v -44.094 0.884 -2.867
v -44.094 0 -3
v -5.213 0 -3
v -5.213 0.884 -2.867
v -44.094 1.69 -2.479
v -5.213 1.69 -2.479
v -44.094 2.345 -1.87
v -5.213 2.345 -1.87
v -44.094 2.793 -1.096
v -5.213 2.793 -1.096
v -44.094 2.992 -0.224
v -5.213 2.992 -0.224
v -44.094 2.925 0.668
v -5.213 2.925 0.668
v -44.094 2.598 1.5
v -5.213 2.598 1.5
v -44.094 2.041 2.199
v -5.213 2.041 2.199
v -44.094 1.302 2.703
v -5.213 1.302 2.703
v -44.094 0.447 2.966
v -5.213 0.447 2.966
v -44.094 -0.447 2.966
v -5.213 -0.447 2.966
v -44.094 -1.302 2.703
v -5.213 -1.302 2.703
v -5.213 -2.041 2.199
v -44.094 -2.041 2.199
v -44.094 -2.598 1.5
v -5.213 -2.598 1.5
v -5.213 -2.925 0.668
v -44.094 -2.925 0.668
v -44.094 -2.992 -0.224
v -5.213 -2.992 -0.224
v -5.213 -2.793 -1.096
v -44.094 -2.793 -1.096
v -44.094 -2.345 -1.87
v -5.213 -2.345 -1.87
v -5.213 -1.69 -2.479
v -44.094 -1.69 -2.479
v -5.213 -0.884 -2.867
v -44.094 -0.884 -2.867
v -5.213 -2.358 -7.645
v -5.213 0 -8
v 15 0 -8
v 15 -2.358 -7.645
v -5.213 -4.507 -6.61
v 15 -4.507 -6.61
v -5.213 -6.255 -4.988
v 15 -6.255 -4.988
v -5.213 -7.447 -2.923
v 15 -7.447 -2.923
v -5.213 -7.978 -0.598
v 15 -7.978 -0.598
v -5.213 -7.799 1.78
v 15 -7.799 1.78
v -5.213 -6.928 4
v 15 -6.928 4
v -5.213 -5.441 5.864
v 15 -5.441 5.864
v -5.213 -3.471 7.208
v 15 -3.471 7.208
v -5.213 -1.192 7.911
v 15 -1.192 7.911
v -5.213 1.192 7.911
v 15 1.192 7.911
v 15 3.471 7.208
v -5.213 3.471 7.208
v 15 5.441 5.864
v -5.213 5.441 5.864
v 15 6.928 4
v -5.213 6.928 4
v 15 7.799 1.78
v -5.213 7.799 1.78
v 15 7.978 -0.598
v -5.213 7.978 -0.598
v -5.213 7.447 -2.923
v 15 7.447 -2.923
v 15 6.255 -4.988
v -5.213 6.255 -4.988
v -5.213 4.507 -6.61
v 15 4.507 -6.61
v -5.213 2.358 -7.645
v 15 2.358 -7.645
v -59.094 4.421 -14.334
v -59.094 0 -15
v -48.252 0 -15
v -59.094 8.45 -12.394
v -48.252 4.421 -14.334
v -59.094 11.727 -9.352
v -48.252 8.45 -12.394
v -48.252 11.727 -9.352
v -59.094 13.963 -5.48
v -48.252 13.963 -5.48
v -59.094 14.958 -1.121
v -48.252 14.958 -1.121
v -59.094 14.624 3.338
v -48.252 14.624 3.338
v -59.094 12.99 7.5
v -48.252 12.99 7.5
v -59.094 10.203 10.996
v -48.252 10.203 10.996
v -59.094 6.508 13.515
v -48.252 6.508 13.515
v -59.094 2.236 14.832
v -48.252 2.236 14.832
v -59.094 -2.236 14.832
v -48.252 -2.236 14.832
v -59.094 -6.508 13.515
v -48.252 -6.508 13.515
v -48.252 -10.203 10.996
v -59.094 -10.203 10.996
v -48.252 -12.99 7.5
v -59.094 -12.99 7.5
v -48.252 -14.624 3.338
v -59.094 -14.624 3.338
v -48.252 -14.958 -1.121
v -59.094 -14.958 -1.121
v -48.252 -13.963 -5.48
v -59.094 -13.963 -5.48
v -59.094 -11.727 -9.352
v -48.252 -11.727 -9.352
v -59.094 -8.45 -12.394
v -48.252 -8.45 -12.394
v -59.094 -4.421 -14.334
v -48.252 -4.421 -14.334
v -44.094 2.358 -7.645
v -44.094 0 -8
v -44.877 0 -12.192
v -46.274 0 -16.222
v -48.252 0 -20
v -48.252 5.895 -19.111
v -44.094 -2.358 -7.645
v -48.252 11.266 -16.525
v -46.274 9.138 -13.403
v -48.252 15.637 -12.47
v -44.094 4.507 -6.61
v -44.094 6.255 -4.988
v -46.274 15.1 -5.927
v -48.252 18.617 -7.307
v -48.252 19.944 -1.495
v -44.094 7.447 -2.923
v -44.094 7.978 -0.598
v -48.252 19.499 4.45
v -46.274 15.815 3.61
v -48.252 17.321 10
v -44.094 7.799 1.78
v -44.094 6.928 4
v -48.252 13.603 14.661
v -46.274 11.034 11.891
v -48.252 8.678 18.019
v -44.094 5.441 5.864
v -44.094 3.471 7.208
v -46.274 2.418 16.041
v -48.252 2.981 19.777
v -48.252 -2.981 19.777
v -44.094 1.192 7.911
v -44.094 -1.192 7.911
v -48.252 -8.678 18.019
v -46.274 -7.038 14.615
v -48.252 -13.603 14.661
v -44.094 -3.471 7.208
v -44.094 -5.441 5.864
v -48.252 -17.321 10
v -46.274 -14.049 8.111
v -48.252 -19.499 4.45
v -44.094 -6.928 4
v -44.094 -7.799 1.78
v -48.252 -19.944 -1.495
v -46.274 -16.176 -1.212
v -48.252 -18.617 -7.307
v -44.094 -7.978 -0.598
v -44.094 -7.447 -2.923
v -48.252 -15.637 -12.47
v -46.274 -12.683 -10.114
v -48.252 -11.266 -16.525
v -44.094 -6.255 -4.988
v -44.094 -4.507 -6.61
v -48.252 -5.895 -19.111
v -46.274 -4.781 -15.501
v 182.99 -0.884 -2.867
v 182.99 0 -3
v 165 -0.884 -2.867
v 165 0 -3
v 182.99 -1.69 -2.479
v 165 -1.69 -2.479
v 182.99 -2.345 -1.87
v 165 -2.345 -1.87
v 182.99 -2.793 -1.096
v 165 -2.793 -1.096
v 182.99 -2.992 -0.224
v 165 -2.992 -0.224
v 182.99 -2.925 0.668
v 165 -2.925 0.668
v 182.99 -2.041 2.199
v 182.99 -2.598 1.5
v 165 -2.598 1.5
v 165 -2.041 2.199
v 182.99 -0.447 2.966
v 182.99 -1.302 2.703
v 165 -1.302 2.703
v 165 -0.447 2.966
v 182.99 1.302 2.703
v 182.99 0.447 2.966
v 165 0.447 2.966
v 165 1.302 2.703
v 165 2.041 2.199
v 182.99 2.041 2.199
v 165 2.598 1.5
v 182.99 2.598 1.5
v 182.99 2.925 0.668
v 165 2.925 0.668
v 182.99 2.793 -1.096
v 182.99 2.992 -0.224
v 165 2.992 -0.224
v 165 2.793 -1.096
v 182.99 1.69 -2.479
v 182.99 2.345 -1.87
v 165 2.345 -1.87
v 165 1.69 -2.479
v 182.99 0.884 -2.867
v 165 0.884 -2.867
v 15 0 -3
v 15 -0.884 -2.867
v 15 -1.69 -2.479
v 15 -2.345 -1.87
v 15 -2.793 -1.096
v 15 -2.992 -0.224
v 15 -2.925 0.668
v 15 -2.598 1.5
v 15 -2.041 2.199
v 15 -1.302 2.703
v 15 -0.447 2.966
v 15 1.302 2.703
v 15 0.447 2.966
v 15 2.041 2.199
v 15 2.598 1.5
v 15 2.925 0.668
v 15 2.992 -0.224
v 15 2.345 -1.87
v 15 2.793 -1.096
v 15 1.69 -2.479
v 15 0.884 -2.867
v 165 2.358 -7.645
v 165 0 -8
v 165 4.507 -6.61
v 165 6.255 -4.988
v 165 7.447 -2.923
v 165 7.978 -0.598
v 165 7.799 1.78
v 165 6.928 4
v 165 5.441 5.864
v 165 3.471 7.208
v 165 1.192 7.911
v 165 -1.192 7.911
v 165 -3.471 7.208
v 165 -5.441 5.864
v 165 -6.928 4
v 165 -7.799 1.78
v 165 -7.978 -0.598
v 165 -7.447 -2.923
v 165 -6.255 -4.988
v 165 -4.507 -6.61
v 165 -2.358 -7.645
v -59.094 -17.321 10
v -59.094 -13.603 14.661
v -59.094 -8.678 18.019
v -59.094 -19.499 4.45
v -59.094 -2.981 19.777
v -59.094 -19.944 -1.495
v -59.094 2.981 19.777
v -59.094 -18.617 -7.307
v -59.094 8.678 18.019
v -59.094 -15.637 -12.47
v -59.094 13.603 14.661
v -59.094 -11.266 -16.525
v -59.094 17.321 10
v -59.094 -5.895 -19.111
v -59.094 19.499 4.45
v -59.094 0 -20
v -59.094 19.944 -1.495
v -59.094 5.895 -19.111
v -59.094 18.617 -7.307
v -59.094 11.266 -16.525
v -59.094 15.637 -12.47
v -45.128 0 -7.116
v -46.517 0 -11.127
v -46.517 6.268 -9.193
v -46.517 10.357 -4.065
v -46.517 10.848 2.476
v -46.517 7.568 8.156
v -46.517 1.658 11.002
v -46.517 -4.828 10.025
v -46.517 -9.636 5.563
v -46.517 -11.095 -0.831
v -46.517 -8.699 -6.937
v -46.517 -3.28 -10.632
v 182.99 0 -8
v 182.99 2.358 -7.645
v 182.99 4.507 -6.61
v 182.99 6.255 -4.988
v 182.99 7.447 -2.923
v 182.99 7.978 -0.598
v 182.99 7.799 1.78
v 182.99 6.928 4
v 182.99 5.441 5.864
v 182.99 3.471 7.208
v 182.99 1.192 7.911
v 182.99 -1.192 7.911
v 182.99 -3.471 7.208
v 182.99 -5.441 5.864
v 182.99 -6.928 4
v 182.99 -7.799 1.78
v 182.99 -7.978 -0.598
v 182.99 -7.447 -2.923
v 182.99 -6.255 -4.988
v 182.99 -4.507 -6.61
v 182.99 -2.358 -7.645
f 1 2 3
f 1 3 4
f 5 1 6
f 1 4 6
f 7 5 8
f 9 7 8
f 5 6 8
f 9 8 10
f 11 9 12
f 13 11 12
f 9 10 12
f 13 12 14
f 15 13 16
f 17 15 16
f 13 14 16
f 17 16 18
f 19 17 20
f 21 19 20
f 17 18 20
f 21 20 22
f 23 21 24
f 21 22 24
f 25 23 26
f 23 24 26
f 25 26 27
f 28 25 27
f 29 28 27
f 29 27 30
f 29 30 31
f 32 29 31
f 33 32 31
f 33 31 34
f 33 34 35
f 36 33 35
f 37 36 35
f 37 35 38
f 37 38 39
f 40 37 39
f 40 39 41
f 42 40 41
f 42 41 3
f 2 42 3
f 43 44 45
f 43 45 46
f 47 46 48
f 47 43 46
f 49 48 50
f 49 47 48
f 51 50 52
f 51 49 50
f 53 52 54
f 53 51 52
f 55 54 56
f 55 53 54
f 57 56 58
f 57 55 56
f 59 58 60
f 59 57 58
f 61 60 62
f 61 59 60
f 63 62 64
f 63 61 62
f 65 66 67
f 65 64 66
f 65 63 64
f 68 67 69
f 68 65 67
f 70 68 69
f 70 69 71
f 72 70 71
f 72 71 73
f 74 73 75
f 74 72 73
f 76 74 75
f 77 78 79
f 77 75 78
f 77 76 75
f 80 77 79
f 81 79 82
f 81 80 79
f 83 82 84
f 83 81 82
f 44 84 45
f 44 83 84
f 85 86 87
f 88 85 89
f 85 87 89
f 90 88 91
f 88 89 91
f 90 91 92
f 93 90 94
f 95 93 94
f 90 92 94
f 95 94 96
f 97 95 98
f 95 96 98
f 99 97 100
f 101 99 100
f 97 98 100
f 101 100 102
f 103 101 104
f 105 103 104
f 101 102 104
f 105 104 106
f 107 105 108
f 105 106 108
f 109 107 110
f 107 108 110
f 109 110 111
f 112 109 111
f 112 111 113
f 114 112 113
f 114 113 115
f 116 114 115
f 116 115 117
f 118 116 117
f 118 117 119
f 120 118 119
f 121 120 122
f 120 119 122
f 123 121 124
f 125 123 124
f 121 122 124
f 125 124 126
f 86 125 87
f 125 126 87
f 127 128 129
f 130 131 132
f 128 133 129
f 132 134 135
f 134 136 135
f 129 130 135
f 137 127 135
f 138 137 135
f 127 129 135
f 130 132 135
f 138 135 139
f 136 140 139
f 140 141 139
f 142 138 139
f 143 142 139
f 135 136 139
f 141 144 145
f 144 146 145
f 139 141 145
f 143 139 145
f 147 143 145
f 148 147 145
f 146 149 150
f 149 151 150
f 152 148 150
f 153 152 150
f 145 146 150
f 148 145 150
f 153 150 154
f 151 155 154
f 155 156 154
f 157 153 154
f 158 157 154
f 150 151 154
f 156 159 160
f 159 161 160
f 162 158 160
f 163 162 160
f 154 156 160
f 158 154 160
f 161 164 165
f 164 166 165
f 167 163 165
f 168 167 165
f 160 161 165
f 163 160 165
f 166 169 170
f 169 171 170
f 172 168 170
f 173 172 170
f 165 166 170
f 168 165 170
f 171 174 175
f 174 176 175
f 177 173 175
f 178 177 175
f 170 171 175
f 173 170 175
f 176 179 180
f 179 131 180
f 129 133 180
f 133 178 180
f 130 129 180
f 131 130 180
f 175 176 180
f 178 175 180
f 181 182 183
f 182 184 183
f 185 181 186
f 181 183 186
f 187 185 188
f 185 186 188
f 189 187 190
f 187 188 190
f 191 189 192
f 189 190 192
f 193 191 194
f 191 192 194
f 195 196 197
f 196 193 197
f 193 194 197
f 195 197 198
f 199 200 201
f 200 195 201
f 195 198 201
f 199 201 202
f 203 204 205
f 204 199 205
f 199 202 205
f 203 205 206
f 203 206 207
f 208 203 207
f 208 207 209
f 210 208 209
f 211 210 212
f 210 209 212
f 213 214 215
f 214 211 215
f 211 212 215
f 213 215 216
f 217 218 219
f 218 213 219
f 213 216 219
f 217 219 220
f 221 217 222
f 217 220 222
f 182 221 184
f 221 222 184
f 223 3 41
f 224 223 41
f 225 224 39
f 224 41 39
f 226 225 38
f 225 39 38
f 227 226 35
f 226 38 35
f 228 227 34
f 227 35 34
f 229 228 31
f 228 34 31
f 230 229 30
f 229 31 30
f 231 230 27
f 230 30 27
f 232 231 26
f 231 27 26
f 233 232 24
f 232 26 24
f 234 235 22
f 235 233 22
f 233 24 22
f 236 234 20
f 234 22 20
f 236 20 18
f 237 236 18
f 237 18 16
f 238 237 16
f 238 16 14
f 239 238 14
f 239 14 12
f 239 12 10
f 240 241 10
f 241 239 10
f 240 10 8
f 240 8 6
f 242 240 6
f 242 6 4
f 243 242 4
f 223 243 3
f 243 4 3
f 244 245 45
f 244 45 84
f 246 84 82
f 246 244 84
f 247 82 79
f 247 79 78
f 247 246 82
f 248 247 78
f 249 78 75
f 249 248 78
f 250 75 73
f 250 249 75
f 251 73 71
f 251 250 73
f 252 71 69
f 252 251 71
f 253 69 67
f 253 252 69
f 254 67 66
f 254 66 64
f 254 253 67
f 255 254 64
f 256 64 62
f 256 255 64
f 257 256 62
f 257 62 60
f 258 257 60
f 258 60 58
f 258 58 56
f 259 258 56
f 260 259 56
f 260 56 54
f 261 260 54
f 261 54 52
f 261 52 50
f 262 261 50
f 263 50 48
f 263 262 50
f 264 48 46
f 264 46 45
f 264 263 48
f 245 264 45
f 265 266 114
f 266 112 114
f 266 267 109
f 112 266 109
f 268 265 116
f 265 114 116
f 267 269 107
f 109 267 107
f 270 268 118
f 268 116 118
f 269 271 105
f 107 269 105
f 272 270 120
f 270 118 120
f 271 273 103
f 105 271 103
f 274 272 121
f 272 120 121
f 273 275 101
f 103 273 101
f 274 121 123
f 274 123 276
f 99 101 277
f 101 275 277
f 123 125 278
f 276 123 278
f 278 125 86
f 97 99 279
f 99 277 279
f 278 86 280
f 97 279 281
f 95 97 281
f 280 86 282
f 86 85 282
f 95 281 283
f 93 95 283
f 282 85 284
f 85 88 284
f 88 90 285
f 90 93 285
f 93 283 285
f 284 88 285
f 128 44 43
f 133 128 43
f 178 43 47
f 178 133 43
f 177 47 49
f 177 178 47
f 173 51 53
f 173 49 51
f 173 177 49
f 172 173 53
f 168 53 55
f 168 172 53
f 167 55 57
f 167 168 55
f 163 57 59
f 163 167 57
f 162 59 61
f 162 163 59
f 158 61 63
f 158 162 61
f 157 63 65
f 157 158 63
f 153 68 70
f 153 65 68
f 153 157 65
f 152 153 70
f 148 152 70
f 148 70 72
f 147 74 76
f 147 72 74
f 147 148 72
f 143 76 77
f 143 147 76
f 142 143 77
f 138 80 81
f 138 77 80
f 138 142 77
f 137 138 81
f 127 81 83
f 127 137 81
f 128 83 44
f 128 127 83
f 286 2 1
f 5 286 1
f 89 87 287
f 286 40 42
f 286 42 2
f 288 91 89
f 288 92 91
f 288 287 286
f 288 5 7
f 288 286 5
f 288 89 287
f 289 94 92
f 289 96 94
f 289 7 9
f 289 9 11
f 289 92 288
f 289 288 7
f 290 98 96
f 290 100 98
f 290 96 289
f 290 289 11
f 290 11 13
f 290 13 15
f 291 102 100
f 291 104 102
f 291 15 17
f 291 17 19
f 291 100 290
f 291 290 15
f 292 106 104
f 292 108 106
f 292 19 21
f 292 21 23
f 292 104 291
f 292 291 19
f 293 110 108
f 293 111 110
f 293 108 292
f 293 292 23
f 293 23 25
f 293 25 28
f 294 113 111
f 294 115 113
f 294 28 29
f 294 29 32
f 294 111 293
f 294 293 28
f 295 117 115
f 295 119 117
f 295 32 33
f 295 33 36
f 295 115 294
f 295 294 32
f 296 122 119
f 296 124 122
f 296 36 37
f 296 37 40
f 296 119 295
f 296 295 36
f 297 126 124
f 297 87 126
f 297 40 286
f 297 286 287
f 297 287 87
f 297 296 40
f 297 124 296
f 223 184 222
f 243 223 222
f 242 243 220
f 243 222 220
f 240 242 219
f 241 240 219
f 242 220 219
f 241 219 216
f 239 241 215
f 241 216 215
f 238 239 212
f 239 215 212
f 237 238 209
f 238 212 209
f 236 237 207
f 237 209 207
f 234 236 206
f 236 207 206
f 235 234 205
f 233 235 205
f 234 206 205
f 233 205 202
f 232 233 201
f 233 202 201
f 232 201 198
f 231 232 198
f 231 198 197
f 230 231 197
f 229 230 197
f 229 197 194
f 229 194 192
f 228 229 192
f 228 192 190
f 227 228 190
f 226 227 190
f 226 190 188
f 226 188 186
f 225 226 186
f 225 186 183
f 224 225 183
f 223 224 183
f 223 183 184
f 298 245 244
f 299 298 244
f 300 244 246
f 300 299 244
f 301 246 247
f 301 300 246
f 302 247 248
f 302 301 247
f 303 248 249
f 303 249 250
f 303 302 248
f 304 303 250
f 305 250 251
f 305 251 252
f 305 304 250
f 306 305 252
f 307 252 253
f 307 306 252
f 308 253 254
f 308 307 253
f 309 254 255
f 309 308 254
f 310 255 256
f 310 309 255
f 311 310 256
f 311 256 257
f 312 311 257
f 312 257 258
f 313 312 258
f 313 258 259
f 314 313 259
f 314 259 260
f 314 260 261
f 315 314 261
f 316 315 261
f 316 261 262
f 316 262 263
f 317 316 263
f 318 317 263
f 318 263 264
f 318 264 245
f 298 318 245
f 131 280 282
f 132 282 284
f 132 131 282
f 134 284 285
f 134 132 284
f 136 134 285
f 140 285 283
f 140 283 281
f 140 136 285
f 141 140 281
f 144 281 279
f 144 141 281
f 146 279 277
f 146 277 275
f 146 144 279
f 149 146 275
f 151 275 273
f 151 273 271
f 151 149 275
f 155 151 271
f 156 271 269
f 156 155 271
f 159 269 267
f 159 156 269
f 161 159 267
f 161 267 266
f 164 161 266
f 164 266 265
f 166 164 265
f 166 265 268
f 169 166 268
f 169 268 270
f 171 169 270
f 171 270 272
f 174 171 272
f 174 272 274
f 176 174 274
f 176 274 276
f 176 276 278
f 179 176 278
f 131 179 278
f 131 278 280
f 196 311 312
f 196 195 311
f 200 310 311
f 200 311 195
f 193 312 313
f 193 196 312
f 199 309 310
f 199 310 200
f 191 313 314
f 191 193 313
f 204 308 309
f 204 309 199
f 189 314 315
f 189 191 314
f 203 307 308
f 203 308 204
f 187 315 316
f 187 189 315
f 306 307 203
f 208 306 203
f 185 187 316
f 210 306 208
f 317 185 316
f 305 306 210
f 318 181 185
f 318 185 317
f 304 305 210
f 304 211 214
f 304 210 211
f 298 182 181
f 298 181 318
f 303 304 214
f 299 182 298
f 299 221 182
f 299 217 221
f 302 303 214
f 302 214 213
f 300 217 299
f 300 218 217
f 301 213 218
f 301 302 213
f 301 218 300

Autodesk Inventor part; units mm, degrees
ref_plane "YZ Plane" through (0, 0, 0) normal (1, 0, 0) x (0, 1, 0)
ref_plane "XZ Plane" through (0, 0, 0) normal (0, 1, 0) x (-1, 0, 0)
ref_plane "XY Plane" through (0, 0, 0) normal (0, 0, 1) x (1, 0, 0)
sketch "Sketch2" plane through (0, 0, 0) normal (0, 1, 0) x (-1, 0, 0)
  line L0 (-15, -3) -> (-165, -3)
  line L1 (-15, -8) -> (-165, -8)
  line L2 (146.5532, 0) -> (-237.9141, 0) projected
  line L3 (59.0935, -15) -> (59.0935, -20)
  line L4 (59.0935, -15) -> (48.2521, -15)
  line L5 (59.0935, -20) -> (48.2521, -20)
  arc A0 (44.0935, -3) -> (48.2521, -15) centre (91.6293, 6.7531) ccw
  arc A1 (44.0935, -8) -> (48.2521, -20) centre (72.6082, -4.8387) ccw
  line L6 (-165, -8) -> (-182.9902, -8)
  line L7 (-182.9902, -3) -> (-165, -3)
  line L8 (-182.9902, -8) -> (-182.9902, -3)
  line L9 (-15, -3) -> (5.213, -3)
  line L10 (-15, -8) -> (5.213, -8)
  line L11 (44.0935, -3) -> (5.213, -3)
  line L12 (5.213, -8) -> (44.0935, -8)
  point P0 (0, 0)
  point P1 (-13.1291, -22.6955)
  point P2 (-13.1263, -14.83)
revolve "Revolution2" add sketch "Sketch2" angle 360 about axis through (-10, 0, 0) along (1, 0, 0)
equation "\"BendRadius\" = Thickness"
equation "\"BendReliefWidth\" = Thickness"
equation "\"BendReliefDepth\" = 0.5 * Thickness"
equation "\"CornerReliefSize\" = 4 * Thickness"
equation "\"MinimumRemnant\" = 2 * Thickness"
equation "\"TransitionRadius\" = BendRadius"
equation "\"JacobiRadiusSize\" = BendRadius"
equation "\"GapSize\" = Thickness"
equation "\"Thickness\" = 0.5"
properties part number "Rubber pipe"
